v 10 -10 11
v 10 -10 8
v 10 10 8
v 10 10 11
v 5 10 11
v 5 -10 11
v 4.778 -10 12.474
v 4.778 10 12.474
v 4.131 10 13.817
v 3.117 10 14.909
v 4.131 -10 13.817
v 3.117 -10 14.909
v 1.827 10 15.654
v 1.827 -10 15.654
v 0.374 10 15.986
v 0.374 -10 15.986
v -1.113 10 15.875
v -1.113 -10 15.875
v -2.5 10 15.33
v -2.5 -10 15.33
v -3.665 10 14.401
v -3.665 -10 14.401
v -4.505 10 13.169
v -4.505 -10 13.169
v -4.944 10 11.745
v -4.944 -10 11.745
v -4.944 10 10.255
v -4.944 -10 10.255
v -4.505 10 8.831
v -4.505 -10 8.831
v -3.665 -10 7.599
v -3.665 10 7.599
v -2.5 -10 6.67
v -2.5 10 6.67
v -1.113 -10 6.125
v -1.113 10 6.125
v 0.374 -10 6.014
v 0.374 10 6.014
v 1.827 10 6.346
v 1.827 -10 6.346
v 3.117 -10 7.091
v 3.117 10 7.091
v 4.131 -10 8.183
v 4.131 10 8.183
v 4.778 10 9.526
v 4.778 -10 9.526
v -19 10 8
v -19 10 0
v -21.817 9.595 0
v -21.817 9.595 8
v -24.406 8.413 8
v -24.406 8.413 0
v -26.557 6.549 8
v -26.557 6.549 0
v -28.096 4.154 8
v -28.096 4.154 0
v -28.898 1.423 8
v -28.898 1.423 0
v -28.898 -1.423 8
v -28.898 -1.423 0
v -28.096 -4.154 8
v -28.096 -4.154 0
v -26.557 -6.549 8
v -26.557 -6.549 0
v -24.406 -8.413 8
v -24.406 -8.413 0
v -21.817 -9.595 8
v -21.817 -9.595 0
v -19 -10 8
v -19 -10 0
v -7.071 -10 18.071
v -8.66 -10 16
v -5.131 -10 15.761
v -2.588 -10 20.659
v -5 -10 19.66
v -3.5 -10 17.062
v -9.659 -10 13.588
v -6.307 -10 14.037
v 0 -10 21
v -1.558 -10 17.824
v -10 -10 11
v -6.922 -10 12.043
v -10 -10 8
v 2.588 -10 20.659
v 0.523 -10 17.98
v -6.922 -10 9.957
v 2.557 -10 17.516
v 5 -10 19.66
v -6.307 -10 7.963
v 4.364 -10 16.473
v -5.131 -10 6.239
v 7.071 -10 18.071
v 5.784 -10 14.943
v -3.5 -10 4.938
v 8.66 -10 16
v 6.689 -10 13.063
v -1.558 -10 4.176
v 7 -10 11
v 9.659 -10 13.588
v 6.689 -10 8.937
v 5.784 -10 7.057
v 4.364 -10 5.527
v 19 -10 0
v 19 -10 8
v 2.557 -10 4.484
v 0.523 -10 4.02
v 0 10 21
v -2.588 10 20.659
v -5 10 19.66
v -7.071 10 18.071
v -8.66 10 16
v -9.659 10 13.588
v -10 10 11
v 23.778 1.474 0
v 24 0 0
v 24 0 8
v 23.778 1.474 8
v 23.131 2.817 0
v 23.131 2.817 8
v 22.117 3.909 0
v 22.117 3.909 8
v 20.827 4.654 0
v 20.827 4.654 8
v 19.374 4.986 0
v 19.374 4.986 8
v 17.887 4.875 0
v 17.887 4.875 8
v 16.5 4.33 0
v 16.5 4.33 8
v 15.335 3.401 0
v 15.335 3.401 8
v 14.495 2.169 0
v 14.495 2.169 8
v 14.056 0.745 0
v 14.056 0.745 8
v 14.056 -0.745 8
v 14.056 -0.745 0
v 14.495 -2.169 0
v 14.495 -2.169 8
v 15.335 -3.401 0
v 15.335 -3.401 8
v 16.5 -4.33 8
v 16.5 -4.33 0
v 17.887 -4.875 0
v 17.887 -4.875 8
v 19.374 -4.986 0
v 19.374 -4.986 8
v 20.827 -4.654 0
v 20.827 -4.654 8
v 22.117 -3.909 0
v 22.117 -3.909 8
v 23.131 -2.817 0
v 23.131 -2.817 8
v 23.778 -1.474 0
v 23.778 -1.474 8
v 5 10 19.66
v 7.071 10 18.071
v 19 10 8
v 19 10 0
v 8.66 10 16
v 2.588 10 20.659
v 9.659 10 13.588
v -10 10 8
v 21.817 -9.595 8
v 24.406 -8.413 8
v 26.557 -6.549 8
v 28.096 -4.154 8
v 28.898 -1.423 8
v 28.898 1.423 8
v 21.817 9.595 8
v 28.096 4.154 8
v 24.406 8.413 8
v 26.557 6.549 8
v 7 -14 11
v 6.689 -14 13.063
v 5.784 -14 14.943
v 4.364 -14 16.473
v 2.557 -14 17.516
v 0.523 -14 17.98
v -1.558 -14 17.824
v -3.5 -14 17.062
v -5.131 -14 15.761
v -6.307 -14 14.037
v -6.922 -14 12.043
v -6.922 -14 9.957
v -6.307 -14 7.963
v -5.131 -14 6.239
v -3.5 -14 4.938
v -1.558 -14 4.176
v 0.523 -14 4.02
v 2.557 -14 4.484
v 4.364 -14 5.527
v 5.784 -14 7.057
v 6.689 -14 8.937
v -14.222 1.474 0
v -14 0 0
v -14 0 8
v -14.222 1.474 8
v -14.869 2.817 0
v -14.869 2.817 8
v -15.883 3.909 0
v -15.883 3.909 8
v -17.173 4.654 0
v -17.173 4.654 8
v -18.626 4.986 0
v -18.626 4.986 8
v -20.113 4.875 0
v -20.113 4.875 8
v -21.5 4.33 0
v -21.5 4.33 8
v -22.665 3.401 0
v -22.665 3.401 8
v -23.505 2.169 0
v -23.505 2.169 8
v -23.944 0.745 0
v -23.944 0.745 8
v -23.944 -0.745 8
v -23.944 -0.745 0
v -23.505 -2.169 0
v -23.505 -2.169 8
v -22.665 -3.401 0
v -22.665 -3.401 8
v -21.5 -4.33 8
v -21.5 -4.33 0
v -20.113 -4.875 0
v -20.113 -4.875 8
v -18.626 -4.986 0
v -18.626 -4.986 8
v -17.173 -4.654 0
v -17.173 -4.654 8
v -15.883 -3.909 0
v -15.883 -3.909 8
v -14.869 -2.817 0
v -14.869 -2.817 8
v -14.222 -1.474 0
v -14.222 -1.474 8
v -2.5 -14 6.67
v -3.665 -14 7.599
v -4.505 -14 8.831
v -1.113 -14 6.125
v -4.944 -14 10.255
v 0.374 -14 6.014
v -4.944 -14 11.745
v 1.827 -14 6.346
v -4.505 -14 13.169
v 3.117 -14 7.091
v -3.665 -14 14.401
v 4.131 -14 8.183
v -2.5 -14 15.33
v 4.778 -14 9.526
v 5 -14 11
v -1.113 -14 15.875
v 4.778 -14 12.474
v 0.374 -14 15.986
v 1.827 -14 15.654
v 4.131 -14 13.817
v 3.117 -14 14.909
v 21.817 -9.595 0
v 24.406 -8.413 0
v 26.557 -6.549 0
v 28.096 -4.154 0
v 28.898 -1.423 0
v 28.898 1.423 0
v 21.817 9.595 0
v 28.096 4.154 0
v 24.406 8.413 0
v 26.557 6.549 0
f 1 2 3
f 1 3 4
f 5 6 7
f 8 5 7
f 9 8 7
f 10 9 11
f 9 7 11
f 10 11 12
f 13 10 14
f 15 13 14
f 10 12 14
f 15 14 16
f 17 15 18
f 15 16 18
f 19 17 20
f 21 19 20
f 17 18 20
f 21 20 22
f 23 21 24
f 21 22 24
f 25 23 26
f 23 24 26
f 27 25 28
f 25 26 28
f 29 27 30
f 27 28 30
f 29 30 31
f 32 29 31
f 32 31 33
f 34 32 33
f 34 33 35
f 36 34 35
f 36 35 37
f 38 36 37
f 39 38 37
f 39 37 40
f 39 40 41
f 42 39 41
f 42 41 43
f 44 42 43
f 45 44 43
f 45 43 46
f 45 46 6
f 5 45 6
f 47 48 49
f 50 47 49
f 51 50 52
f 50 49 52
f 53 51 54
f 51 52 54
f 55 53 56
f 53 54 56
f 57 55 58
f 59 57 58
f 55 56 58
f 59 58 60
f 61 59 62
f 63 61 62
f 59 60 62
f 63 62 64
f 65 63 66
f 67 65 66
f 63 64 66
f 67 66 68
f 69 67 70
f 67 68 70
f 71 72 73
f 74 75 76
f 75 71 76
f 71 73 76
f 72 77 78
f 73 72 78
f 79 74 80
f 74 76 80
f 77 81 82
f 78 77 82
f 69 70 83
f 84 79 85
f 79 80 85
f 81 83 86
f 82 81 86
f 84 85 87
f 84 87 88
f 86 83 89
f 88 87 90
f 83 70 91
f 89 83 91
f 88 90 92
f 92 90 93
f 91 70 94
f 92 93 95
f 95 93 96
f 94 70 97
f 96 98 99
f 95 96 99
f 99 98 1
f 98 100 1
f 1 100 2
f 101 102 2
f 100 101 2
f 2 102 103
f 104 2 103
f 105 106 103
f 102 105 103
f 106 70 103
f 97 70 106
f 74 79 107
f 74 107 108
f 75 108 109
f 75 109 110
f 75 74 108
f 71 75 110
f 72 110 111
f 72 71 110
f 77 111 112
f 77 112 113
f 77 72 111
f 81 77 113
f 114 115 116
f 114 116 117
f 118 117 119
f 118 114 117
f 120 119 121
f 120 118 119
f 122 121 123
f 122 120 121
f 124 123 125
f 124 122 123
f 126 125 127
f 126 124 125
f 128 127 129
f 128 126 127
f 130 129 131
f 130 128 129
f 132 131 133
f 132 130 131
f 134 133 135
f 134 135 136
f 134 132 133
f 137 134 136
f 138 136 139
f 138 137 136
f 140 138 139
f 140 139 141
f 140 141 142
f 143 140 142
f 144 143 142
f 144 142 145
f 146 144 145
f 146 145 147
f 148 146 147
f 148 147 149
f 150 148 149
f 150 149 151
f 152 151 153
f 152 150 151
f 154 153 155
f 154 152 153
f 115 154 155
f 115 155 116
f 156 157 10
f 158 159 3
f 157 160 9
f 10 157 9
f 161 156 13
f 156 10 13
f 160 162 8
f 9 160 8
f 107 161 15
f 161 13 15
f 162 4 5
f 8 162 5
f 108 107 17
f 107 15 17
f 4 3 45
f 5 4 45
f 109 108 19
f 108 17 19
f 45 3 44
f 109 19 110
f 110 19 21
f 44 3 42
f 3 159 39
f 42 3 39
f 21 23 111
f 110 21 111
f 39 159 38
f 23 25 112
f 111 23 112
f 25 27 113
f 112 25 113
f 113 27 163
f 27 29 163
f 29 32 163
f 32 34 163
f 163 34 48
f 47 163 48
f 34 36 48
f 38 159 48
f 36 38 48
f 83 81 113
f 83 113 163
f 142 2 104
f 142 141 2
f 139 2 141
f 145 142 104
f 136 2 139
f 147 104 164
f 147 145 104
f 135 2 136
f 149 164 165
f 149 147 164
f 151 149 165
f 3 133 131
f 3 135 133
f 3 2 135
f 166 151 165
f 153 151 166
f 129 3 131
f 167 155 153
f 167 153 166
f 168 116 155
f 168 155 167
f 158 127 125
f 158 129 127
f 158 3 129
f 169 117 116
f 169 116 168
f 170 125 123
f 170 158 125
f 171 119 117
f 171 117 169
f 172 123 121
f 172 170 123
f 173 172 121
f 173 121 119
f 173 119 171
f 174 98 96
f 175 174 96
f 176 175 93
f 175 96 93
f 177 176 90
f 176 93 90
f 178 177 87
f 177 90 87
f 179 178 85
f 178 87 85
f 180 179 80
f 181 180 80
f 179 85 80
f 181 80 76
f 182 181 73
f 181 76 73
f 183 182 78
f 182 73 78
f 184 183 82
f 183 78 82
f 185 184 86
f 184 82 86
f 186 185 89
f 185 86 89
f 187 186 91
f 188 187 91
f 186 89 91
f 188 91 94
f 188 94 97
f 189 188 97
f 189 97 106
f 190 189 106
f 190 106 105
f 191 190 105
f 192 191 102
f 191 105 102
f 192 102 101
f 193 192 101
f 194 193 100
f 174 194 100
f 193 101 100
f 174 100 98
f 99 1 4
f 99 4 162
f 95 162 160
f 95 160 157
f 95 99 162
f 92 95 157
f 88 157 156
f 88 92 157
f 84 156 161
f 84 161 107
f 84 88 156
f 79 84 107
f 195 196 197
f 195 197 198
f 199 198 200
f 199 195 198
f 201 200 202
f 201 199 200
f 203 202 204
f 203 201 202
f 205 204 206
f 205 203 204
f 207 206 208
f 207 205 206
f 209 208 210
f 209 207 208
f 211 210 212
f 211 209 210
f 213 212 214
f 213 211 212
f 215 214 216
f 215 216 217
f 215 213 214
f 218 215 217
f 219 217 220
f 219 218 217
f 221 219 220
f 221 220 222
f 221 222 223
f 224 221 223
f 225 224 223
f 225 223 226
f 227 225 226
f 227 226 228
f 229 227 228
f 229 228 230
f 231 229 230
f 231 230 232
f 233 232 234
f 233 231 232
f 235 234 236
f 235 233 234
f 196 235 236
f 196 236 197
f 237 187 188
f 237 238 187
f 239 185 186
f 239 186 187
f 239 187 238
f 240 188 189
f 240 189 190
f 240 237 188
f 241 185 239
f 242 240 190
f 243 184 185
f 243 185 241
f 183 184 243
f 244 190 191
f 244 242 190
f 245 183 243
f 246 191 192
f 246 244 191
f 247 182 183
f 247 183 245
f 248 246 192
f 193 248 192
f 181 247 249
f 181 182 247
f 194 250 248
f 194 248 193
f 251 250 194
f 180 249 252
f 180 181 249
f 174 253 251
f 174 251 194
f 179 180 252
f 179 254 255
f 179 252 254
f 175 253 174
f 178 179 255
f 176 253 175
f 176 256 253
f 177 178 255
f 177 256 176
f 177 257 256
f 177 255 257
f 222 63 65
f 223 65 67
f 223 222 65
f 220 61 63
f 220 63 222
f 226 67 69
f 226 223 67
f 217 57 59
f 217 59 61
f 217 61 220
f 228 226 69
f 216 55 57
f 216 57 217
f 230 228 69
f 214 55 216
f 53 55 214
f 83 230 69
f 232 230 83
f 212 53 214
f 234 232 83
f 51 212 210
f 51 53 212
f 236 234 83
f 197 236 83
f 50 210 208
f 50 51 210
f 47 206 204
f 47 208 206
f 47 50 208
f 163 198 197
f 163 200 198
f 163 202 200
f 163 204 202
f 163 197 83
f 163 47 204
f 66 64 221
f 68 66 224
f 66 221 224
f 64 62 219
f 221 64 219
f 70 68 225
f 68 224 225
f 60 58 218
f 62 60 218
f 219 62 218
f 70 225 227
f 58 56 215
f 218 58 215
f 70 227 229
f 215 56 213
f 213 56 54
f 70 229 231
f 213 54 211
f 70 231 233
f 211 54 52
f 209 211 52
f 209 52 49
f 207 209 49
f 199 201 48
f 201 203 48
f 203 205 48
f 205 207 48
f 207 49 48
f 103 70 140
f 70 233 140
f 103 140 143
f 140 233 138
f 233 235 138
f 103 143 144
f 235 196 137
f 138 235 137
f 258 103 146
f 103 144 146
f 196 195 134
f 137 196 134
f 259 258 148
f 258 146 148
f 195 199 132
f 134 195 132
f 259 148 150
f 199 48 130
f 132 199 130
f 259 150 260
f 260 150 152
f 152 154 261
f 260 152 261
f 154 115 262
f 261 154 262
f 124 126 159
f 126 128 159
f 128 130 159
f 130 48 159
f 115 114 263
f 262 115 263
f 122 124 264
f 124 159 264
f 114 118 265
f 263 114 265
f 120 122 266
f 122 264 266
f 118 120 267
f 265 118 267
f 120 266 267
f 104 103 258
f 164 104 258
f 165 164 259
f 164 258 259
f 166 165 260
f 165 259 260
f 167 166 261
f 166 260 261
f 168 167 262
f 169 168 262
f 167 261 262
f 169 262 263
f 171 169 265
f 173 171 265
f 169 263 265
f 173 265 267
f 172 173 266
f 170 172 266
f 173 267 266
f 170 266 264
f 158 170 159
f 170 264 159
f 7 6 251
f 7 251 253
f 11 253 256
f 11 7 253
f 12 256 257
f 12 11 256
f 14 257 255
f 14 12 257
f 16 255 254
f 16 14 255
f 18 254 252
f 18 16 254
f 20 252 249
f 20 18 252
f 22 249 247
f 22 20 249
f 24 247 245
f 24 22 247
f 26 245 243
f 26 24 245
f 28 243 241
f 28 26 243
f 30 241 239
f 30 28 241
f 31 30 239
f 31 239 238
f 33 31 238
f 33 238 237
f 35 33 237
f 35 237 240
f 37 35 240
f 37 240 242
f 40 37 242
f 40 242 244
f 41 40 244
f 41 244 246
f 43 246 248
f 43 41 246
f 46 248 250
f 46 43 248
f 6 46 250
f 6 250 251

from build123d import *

# Parameters (mm, degrees)
F0_R     = 5
F1_DEPTH = 8
F3_DEPTH = 20
F4_R     = 7
F4_R_2   = 5
F5_DEPTH = 4
F6_DEPTH = 20.001


with BuildPart() as f1:
    # F0 (on Top) → F1 (new body)
    with BuildSketch(Plane.XY):
        with BuildLine():
            ThreePointArc((-19, 10), (-29, 0), (-19, -10))
            Line((-19, -10), (19, -10))
            ThreePointArc((19, -10), (29, 0), (19, 10))
            Line((19, 10), (-19, 10))
        make_face()
        with Locations((-19, 0)):
            Circle(F0_R, mode=Mode.SUBTRACT)
        with Locations((19, 0)):
            Circle(F0_R, mode=Mode.SUBTRACT)
    extrude(amount=F1_DEPTH)

    # F2 (on face) → F3 (join, through all)
    with BuildSketch(Plane.XZ.offset(10)):
        with BuildLine():
            Line((-10, 11), (-10, 8))
            Line((-10, 8), (0, 8))
            Line((0, 8), (10, 8))
            Line((10, 8), (10, 11))
            ThreePointArc((10, 11), (7.071068, 18.071068), (0, 21))
            ThreePointArc((0, 21), (-7.071068, 18.071068), (-10, 11))
        make_face()
    extrude(amount=-F3_DEPTH)

    # F4 (on face) → F5 (join)
    with BuildSketch(Plane.XZ.offset(10)):
        with Locations((0, 11)):
            Circle(F4_R)
        with Locations((0, 11)):
            Circle(F4_R_2, mode=Mode.SUBTRACT)
    extrude(amount=F5_DEPTH)

    # F4 (on face) → F6 (cut, through all)
    with BuildSketch(Plane.XZ.offset(10)):
        with Locations((0, 11)):
            Circle(F4_R_2)
    extrude(amount=-F6_DEPTH, mode=Mode.SUBTRACT)


solid = f1.part
